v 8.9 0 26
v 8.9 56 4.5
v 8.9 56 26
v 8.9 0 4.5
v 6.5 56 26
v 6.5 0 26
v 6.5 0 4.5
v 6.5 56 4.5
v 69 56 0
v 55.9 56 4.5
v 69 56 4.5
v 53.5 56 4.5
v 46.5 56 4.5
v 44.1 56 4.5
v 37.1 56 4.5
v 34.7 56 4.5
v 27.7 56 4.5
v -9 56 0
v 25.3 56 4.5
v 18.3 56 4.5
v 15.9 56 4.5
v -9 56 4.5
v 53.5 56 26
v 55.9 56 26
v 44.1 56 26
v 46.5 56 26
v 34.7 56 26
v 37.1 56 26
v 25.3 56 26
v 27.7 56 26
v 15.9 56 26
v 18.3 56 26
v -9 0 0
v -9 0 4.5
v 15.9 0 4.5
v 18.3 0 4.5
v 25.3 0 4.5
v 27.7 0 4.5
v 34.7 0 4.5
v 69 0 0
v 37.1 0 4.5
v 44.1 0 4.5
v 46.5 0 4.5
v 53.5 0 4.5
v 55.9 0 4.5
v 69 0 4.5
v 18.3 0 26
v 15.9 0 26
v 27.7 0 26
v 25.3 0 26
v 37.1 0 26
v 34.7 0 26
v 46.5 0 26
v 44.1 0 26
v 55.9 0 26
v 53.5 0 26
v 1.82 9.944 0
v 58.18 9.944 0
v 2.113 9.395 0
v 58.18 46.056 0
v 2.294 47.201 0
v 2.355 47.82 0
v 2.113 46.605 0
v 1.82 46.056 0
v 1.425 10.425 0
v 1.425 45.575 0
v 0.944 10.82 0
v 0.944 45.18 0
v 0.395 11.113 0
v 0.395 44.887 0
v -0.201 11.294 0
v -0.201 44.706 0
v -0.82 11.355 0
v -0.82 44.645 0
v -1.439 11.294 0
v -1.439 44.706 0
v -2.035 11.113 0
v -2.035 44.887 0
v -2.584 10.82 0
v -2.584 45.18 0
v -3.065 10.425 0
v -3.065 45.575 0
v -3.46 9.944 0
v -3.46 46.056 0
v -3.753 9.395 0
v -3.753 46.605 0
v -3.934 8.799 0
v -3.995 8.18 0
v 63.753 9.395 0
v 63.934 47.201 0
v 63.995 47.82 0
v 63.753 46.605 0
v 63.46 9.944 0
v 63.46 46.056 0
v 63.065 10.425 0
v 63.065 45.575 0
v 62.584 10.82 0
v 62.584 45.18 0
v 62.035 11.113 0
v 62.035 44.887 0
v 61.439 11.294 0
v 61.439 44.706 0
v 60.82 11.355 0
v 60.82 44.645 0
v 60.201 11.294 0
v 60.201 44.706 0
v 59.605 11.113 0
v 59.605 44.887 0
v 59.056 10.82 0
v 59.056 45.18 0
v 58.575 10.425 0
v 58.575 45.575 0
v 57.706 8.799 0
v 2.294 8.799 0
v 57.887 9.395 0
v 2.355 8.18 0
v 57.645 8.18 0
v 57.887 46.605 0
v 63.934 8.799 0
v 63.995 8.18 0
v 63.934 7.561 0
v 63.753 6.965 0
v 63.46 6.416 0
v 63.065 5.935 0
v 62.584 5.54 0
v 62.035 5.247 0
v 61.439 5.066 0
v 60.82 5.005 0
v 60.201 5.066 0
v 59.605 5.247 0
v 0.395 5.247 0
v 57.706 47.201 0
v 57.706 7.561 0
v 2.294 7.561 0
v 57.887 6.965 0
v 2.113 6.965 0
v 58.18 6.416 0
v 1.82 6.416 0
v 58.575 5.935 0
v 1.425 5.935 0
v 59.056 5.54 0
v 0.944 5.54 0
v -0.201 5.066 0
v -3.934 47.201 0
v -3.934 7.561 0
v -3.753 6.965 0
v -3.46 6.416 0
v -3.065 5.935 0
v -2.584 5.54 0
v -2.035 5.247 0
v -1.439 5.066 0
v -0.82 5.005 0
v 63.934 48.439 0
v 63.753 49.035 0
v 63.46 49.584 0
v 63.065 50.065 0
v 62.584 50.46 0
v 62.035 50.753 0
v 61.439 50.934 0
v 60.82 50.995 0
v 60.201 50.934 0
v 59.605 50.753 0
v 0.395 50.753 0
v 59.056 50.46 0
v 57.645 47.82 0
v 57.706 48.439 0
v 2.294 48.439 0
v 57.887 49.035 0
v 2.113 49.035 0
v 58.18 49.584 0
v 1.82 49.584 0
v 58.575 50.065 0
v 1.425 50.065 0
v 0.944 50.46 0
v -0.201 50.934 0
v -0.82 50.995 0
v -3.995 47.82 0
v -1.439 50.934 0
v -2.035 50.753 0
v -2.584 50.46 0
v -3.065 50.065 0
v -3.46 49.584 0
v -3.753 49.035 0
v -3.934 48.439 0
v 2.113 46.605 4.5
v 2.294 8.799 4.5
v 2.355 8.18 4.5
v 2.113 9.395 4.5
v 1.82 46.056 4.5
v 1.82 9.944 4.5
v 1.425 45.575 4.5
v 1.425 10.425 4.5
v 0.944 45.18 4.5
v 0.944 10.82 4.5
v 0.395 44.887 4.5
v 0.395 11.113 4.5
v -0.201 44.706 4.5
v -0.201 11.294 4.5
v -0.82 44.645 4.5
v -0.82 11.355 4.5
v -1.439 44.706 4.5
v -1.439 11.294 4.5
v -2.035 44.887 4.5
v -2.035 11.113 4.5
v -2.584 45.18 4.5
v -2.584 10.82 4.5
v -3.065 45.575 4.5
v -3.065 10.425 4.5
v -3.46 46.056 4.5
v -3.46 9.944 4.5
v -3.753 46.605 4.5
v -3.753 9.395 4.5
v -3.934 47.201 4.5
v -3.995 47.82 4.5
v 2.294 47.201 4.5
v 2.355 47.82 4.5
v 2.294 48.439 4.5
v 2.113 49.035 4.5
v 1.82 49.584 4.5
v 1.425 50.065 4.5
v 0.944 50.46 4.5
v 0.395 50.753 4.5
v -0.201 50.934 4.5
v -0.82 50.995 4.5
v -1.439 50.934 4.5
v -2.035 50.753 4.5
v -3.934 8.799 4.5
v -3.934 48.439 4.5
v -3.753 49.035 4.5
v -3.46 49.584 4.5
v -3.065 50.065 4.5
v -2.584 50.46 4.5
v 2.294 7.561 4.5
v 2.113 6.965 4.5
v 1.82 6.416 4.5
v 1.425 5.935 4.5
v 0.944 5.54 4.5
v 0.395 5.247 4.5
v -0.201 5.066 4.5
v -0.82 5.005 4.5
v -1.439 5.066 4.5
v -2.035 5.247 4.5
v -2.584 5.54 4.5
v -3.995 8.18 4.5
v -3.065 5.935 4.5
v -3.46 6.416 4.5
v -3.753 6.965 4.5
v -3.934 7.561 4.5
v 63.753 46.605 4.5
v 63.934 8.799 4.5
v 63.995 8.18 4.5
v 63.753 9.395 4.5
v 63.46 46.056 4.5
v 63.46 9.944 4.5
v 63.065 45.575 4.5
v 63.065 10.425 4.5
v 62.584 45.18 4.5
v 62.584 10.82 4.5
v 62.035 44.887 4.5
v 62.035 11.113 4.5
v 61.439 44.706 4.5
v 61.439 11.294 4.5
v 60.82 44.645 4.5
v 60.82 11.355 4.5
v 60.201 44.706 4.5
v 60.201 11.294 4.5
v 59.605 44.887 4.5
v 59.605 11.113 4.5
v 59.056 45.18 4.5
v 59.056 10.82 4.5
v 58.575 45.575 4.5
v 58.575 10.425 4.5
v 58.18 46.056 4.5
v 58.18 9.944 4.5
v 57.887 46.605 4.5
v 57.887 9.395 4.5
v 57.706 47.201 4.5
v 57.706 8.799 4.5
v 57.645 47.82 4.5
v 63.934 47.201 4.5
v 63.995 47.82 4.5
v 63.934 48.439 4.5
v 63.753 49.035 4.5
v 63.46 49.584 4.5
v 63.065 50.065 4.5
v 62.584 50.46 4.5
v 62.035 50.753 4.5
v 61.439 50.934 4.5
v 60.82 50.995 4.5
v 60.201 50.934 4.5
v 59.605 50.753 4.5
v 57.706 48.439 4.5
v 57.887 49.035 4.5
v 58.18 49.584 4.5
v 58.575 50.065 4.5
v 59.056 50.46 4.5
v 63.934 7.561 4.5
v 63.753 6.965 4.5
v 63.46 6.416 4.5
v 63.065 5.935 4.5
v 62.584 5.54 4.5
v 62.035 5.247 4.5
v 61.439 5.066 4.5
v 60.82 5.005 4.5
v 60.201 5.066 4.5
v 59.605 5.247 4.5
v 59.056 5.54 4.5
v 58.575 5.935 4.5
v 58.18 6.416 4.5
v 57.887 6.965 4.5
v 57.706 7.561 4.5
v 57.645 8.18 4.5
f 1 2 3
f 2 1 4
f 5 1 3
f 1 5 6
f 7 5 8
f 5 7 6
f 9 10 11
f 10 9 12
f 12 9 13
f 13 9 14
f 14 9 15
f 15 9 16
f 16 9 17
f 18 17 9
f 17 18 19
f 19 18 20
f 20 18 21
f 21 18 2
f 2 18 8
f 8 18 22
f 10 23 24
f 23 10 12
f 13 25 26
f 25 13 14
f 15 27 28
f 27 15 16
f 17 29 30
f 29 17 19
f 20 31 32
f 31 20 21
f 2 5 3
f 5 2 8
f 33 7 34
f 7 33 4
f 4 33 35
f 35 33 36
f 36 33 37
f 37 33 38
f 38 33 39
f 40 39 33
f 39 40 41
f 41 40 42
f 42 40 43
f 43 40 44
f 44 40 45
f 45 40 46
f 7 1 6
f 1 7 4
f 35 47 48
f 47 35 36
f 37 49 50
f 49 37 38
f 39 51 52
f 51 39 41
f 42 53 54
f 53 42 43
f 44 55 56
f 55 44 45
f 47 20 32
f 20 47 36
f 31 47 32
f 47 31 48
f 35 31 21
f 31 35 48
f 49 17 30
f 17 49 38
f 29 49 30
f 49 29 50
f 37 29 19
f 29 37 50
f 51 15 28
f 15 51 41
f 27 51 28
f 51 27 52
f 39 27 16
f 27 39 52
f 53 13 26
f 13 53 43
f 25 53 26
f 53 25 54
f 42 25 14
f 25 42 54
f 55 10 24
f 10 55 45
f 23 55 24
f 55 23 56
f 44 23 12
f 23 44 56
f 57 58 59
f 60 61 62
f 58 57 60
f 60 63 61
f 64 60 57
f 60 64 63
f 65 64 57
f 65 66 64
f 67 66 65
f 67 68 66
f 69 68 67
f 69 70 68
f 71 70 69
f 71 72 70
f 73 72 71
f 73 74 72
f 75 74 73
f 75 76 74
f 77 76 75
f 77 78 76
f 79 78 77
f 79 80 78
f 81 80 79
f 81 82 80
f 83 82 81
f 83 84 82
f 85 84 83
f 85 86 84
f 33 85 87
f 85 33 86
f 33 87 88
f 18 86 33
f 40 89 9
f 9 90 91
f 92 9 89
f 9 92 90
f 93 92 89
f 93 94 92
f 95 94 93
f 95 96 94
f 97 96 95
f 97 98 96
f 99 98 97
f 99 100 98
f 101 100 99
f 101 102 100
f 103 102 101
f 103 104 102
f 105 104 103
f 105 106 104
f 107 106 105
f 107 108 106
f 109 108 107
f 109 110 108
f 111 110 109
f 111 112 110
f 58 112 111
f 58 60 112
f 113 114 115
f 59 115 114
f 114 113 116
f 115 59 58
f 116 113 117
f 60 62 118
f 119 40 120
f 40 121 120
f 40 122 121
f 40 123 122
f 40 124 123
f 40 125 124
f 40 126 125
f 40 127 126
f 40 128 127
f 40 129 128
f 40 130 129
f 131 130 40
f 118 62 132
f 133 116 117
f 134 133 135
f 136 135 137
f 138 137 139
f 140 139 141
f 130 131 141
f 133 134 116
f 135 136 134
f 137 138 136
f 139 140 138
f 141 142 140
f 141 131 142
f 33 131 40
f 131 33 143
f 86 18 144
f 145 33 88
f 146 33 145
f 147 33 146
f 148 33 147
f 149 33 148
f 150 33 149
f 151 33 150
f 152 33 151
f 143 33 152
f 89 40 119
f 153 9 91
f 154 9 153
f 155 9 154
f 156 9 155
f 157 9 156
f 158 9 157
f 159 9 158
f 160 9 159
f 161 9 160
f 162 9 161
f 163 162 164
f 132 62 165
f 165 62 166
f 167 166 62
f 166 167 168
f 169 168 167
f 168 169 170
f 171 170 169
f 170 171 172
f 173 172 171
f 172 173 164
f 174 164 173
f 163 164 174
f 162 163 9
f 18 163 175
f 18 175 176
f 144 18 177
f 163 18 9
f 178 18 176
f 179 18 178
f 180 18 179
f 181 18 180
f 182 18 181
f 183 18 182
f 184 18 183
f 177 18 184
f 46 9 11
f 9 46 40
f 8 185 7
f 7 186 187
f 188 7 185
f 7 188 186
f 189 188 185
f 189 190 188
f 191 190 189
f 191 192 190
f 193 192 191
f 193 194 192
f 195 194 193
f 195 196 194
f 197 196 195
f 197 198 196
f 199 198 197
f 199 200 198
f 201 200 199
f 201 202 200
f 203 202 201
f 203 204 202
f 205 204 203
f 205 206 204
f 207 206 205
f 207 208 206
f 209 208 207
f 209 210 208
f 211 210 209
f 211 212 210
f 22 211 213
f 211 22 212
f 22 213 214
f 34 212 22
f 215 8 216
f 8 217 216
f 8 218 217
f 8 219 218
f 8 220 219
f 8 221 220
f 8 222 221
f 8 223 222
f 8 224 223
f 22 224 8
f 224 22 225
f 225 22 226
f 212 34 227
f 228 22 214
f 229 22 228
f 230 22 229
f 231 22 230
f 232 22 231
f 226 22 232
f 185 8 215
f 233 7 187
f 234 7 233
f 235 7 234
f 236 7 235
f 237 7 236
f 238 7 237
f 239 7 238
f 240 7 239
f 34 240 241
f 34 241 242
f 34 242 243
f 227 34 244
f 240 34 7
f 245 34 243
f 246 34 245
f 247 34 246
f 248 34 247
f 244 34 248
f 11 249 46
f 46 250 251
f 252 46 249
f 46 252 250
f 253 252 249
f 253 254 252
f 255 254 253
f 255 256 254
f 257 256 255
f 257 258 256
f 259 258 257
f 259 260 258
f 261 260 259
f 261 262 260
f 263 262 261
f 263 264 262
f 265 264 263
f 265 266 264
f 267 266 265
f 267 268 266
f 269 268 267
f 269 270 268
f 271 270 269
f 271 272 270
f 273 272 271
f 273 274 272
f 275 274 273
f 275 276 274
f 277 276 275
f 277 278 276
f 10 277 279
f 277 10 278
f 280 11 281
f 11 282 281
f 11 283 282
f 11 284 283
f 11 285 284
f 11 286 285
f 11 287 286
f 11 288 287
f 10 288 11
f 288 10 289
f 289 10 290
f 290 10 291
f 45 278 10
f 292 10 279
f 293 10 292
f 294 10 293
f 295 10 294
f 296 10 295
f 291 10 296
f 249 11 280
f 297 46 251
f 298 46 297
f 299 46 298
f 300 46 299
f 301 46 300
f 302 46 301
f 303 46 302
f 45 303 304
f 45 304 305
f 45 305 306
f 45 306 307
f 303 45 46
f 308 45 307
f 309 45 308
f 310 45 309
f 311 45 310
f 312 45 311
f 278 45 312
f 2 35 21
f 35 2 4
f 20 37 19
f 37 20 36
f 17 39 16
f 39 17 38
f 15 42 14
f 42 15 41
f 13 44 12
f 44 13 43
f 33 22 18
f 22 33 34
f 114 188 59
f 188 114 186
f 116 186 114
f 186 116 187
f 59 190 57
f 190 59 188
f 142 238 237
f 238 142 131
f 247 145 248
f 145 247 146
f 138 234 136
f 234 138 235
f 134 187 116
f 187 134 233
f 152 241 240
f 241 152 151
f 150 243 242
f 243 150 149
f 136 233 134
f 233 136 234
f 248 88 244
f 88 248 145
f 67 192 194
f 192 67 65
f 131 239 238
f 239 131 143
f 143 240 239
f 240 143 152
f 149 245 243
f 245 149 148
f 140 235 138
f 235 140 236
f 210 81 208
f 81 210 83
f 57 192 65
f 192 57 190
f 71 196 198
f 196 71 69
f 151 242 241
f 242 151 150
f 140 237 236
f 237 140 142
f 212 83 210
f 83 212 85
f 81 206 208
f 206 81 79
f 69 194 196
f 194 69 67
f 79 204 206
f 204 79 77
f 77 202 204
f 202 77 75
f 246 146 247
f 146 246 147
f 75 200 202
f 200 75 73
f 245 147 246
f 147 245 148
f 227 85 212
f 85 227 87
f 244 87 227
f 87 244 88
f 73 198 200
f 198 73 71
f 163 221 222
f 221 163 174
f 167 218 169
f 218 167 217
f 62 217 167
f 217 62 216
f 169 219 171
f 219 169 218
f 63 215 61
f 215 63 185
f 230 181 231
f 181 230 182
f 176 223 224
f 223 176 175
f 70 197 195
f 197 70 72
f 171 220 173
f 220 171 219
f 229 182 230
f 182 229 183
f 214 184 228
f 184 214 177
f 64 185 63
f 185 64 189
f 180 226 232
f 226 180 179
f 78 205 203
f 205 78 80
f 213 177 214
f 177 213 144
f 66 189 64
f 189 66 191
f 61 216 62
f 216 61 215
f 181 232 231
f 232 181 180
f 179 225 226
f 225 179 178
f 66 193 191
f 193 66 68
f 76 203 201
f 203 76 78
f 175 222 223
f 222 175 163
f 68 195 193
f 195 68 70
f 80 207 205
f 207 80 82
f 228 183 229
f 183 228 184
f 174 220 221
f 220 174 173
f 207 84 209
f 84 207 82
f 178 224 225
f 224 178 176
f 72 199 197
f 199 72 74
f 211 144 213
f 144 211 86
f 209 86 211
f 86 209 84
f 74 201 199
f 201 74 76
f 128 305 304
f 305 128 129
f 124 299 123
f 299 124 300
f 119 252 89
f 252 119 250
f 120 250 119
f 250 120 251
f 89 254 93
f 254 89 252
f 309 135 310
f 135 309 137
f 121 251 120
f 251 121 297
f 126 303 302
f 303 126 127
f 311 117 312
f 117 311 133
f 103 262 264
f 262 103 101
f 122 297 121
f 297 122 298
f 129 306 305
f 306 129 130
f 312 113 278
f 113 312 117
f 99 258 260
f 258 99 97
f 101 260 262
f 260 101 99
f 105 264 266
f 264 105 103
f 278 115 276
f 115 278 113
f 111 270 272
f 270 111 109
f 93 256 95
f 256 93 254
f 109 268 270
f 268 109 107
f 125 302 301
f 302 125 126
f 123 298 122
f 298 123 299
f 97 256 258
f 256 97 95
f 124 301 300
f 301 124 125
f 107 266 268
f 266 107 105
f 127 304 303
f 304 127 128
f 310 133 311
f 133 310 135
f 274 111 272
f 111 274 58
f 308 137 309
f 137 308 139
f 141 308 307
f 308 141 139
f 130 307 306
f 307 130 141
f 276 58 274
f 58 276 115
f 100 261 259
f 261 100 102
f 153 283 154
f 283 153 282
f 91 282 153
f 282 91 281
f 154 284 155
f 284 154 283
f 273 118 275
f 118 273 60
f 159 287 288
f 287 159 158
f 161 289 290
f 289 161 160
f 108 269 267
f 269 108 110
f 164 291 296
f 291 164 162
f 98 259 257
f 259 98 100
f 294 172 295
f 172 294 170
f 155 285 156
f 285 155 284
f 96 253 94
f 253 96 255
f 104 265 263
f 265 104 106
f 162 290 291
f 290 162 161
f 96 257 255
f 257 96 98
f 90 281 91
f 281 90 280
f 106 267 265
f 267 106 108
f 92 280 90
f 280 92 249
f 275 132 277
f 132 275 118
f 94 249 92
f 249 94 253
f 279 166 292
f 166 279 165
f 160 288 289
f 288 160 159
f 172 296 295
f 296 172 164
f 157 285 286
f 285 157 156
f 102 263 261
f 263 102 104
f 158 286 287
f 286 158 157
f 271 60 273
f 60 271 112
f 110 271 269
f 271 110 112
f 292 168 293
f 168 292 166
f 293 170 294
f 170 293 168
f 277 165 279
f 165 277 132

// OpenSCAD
$fn = 32;

// ----------------------------------------------------------------------
// Finned heat sink: 60 x 56 mm base, 22 mm fins
// ----------------------------------------------------------------------

// --- parameters (mm) ---
base_w = 60;              // base width
base_d = 56;              // base depth
base_t = 4;               // base thickness
fin_h = 22;               // fin height above the base
holes_d = 6.35;           // fixing holes
hole_x = 30.82;           // hole offset in x
hole_y = 19.82;           // hole offset in y
fin_t = 2.4;              // fin thickness
fin_pitch = 9.4;          // fin pitch
fin_count = 6;            // number of fins
fin_x0 = 6.5;             // first fin offset
flange_w = 78;            // flange plate width
flange_t = 4;             // flange plate thickness

difference() {
  union() {
    cube([base_w, base_d, base_t]);
    for (i = [0 : fin_count - 1]) {
      translate([fin_x0 + i * fin_pitch, 0, base_t - 0.5]) cube([fin_t, base_d, fin_h + 0.5]);
    }
    /* mounting flange, a wider plate sharing the base bottom */
    translate([(base_w - flange_w) / 2, 0, 0]) cube([flange_w, base_d, flange_t + 0.5]);
  }
  /* fixing holes through the base, 2.5 mm clear on both sides */
  for (hx = [-30.82, 30.82]) {
    for (hy = [-19.82, 19.82]) {
      translate([base_w / 2 + hx, base_d / 2 + hy, -2.5]) cylinder(h = base_t + 5, d = holes_d);
    }
  }
}
